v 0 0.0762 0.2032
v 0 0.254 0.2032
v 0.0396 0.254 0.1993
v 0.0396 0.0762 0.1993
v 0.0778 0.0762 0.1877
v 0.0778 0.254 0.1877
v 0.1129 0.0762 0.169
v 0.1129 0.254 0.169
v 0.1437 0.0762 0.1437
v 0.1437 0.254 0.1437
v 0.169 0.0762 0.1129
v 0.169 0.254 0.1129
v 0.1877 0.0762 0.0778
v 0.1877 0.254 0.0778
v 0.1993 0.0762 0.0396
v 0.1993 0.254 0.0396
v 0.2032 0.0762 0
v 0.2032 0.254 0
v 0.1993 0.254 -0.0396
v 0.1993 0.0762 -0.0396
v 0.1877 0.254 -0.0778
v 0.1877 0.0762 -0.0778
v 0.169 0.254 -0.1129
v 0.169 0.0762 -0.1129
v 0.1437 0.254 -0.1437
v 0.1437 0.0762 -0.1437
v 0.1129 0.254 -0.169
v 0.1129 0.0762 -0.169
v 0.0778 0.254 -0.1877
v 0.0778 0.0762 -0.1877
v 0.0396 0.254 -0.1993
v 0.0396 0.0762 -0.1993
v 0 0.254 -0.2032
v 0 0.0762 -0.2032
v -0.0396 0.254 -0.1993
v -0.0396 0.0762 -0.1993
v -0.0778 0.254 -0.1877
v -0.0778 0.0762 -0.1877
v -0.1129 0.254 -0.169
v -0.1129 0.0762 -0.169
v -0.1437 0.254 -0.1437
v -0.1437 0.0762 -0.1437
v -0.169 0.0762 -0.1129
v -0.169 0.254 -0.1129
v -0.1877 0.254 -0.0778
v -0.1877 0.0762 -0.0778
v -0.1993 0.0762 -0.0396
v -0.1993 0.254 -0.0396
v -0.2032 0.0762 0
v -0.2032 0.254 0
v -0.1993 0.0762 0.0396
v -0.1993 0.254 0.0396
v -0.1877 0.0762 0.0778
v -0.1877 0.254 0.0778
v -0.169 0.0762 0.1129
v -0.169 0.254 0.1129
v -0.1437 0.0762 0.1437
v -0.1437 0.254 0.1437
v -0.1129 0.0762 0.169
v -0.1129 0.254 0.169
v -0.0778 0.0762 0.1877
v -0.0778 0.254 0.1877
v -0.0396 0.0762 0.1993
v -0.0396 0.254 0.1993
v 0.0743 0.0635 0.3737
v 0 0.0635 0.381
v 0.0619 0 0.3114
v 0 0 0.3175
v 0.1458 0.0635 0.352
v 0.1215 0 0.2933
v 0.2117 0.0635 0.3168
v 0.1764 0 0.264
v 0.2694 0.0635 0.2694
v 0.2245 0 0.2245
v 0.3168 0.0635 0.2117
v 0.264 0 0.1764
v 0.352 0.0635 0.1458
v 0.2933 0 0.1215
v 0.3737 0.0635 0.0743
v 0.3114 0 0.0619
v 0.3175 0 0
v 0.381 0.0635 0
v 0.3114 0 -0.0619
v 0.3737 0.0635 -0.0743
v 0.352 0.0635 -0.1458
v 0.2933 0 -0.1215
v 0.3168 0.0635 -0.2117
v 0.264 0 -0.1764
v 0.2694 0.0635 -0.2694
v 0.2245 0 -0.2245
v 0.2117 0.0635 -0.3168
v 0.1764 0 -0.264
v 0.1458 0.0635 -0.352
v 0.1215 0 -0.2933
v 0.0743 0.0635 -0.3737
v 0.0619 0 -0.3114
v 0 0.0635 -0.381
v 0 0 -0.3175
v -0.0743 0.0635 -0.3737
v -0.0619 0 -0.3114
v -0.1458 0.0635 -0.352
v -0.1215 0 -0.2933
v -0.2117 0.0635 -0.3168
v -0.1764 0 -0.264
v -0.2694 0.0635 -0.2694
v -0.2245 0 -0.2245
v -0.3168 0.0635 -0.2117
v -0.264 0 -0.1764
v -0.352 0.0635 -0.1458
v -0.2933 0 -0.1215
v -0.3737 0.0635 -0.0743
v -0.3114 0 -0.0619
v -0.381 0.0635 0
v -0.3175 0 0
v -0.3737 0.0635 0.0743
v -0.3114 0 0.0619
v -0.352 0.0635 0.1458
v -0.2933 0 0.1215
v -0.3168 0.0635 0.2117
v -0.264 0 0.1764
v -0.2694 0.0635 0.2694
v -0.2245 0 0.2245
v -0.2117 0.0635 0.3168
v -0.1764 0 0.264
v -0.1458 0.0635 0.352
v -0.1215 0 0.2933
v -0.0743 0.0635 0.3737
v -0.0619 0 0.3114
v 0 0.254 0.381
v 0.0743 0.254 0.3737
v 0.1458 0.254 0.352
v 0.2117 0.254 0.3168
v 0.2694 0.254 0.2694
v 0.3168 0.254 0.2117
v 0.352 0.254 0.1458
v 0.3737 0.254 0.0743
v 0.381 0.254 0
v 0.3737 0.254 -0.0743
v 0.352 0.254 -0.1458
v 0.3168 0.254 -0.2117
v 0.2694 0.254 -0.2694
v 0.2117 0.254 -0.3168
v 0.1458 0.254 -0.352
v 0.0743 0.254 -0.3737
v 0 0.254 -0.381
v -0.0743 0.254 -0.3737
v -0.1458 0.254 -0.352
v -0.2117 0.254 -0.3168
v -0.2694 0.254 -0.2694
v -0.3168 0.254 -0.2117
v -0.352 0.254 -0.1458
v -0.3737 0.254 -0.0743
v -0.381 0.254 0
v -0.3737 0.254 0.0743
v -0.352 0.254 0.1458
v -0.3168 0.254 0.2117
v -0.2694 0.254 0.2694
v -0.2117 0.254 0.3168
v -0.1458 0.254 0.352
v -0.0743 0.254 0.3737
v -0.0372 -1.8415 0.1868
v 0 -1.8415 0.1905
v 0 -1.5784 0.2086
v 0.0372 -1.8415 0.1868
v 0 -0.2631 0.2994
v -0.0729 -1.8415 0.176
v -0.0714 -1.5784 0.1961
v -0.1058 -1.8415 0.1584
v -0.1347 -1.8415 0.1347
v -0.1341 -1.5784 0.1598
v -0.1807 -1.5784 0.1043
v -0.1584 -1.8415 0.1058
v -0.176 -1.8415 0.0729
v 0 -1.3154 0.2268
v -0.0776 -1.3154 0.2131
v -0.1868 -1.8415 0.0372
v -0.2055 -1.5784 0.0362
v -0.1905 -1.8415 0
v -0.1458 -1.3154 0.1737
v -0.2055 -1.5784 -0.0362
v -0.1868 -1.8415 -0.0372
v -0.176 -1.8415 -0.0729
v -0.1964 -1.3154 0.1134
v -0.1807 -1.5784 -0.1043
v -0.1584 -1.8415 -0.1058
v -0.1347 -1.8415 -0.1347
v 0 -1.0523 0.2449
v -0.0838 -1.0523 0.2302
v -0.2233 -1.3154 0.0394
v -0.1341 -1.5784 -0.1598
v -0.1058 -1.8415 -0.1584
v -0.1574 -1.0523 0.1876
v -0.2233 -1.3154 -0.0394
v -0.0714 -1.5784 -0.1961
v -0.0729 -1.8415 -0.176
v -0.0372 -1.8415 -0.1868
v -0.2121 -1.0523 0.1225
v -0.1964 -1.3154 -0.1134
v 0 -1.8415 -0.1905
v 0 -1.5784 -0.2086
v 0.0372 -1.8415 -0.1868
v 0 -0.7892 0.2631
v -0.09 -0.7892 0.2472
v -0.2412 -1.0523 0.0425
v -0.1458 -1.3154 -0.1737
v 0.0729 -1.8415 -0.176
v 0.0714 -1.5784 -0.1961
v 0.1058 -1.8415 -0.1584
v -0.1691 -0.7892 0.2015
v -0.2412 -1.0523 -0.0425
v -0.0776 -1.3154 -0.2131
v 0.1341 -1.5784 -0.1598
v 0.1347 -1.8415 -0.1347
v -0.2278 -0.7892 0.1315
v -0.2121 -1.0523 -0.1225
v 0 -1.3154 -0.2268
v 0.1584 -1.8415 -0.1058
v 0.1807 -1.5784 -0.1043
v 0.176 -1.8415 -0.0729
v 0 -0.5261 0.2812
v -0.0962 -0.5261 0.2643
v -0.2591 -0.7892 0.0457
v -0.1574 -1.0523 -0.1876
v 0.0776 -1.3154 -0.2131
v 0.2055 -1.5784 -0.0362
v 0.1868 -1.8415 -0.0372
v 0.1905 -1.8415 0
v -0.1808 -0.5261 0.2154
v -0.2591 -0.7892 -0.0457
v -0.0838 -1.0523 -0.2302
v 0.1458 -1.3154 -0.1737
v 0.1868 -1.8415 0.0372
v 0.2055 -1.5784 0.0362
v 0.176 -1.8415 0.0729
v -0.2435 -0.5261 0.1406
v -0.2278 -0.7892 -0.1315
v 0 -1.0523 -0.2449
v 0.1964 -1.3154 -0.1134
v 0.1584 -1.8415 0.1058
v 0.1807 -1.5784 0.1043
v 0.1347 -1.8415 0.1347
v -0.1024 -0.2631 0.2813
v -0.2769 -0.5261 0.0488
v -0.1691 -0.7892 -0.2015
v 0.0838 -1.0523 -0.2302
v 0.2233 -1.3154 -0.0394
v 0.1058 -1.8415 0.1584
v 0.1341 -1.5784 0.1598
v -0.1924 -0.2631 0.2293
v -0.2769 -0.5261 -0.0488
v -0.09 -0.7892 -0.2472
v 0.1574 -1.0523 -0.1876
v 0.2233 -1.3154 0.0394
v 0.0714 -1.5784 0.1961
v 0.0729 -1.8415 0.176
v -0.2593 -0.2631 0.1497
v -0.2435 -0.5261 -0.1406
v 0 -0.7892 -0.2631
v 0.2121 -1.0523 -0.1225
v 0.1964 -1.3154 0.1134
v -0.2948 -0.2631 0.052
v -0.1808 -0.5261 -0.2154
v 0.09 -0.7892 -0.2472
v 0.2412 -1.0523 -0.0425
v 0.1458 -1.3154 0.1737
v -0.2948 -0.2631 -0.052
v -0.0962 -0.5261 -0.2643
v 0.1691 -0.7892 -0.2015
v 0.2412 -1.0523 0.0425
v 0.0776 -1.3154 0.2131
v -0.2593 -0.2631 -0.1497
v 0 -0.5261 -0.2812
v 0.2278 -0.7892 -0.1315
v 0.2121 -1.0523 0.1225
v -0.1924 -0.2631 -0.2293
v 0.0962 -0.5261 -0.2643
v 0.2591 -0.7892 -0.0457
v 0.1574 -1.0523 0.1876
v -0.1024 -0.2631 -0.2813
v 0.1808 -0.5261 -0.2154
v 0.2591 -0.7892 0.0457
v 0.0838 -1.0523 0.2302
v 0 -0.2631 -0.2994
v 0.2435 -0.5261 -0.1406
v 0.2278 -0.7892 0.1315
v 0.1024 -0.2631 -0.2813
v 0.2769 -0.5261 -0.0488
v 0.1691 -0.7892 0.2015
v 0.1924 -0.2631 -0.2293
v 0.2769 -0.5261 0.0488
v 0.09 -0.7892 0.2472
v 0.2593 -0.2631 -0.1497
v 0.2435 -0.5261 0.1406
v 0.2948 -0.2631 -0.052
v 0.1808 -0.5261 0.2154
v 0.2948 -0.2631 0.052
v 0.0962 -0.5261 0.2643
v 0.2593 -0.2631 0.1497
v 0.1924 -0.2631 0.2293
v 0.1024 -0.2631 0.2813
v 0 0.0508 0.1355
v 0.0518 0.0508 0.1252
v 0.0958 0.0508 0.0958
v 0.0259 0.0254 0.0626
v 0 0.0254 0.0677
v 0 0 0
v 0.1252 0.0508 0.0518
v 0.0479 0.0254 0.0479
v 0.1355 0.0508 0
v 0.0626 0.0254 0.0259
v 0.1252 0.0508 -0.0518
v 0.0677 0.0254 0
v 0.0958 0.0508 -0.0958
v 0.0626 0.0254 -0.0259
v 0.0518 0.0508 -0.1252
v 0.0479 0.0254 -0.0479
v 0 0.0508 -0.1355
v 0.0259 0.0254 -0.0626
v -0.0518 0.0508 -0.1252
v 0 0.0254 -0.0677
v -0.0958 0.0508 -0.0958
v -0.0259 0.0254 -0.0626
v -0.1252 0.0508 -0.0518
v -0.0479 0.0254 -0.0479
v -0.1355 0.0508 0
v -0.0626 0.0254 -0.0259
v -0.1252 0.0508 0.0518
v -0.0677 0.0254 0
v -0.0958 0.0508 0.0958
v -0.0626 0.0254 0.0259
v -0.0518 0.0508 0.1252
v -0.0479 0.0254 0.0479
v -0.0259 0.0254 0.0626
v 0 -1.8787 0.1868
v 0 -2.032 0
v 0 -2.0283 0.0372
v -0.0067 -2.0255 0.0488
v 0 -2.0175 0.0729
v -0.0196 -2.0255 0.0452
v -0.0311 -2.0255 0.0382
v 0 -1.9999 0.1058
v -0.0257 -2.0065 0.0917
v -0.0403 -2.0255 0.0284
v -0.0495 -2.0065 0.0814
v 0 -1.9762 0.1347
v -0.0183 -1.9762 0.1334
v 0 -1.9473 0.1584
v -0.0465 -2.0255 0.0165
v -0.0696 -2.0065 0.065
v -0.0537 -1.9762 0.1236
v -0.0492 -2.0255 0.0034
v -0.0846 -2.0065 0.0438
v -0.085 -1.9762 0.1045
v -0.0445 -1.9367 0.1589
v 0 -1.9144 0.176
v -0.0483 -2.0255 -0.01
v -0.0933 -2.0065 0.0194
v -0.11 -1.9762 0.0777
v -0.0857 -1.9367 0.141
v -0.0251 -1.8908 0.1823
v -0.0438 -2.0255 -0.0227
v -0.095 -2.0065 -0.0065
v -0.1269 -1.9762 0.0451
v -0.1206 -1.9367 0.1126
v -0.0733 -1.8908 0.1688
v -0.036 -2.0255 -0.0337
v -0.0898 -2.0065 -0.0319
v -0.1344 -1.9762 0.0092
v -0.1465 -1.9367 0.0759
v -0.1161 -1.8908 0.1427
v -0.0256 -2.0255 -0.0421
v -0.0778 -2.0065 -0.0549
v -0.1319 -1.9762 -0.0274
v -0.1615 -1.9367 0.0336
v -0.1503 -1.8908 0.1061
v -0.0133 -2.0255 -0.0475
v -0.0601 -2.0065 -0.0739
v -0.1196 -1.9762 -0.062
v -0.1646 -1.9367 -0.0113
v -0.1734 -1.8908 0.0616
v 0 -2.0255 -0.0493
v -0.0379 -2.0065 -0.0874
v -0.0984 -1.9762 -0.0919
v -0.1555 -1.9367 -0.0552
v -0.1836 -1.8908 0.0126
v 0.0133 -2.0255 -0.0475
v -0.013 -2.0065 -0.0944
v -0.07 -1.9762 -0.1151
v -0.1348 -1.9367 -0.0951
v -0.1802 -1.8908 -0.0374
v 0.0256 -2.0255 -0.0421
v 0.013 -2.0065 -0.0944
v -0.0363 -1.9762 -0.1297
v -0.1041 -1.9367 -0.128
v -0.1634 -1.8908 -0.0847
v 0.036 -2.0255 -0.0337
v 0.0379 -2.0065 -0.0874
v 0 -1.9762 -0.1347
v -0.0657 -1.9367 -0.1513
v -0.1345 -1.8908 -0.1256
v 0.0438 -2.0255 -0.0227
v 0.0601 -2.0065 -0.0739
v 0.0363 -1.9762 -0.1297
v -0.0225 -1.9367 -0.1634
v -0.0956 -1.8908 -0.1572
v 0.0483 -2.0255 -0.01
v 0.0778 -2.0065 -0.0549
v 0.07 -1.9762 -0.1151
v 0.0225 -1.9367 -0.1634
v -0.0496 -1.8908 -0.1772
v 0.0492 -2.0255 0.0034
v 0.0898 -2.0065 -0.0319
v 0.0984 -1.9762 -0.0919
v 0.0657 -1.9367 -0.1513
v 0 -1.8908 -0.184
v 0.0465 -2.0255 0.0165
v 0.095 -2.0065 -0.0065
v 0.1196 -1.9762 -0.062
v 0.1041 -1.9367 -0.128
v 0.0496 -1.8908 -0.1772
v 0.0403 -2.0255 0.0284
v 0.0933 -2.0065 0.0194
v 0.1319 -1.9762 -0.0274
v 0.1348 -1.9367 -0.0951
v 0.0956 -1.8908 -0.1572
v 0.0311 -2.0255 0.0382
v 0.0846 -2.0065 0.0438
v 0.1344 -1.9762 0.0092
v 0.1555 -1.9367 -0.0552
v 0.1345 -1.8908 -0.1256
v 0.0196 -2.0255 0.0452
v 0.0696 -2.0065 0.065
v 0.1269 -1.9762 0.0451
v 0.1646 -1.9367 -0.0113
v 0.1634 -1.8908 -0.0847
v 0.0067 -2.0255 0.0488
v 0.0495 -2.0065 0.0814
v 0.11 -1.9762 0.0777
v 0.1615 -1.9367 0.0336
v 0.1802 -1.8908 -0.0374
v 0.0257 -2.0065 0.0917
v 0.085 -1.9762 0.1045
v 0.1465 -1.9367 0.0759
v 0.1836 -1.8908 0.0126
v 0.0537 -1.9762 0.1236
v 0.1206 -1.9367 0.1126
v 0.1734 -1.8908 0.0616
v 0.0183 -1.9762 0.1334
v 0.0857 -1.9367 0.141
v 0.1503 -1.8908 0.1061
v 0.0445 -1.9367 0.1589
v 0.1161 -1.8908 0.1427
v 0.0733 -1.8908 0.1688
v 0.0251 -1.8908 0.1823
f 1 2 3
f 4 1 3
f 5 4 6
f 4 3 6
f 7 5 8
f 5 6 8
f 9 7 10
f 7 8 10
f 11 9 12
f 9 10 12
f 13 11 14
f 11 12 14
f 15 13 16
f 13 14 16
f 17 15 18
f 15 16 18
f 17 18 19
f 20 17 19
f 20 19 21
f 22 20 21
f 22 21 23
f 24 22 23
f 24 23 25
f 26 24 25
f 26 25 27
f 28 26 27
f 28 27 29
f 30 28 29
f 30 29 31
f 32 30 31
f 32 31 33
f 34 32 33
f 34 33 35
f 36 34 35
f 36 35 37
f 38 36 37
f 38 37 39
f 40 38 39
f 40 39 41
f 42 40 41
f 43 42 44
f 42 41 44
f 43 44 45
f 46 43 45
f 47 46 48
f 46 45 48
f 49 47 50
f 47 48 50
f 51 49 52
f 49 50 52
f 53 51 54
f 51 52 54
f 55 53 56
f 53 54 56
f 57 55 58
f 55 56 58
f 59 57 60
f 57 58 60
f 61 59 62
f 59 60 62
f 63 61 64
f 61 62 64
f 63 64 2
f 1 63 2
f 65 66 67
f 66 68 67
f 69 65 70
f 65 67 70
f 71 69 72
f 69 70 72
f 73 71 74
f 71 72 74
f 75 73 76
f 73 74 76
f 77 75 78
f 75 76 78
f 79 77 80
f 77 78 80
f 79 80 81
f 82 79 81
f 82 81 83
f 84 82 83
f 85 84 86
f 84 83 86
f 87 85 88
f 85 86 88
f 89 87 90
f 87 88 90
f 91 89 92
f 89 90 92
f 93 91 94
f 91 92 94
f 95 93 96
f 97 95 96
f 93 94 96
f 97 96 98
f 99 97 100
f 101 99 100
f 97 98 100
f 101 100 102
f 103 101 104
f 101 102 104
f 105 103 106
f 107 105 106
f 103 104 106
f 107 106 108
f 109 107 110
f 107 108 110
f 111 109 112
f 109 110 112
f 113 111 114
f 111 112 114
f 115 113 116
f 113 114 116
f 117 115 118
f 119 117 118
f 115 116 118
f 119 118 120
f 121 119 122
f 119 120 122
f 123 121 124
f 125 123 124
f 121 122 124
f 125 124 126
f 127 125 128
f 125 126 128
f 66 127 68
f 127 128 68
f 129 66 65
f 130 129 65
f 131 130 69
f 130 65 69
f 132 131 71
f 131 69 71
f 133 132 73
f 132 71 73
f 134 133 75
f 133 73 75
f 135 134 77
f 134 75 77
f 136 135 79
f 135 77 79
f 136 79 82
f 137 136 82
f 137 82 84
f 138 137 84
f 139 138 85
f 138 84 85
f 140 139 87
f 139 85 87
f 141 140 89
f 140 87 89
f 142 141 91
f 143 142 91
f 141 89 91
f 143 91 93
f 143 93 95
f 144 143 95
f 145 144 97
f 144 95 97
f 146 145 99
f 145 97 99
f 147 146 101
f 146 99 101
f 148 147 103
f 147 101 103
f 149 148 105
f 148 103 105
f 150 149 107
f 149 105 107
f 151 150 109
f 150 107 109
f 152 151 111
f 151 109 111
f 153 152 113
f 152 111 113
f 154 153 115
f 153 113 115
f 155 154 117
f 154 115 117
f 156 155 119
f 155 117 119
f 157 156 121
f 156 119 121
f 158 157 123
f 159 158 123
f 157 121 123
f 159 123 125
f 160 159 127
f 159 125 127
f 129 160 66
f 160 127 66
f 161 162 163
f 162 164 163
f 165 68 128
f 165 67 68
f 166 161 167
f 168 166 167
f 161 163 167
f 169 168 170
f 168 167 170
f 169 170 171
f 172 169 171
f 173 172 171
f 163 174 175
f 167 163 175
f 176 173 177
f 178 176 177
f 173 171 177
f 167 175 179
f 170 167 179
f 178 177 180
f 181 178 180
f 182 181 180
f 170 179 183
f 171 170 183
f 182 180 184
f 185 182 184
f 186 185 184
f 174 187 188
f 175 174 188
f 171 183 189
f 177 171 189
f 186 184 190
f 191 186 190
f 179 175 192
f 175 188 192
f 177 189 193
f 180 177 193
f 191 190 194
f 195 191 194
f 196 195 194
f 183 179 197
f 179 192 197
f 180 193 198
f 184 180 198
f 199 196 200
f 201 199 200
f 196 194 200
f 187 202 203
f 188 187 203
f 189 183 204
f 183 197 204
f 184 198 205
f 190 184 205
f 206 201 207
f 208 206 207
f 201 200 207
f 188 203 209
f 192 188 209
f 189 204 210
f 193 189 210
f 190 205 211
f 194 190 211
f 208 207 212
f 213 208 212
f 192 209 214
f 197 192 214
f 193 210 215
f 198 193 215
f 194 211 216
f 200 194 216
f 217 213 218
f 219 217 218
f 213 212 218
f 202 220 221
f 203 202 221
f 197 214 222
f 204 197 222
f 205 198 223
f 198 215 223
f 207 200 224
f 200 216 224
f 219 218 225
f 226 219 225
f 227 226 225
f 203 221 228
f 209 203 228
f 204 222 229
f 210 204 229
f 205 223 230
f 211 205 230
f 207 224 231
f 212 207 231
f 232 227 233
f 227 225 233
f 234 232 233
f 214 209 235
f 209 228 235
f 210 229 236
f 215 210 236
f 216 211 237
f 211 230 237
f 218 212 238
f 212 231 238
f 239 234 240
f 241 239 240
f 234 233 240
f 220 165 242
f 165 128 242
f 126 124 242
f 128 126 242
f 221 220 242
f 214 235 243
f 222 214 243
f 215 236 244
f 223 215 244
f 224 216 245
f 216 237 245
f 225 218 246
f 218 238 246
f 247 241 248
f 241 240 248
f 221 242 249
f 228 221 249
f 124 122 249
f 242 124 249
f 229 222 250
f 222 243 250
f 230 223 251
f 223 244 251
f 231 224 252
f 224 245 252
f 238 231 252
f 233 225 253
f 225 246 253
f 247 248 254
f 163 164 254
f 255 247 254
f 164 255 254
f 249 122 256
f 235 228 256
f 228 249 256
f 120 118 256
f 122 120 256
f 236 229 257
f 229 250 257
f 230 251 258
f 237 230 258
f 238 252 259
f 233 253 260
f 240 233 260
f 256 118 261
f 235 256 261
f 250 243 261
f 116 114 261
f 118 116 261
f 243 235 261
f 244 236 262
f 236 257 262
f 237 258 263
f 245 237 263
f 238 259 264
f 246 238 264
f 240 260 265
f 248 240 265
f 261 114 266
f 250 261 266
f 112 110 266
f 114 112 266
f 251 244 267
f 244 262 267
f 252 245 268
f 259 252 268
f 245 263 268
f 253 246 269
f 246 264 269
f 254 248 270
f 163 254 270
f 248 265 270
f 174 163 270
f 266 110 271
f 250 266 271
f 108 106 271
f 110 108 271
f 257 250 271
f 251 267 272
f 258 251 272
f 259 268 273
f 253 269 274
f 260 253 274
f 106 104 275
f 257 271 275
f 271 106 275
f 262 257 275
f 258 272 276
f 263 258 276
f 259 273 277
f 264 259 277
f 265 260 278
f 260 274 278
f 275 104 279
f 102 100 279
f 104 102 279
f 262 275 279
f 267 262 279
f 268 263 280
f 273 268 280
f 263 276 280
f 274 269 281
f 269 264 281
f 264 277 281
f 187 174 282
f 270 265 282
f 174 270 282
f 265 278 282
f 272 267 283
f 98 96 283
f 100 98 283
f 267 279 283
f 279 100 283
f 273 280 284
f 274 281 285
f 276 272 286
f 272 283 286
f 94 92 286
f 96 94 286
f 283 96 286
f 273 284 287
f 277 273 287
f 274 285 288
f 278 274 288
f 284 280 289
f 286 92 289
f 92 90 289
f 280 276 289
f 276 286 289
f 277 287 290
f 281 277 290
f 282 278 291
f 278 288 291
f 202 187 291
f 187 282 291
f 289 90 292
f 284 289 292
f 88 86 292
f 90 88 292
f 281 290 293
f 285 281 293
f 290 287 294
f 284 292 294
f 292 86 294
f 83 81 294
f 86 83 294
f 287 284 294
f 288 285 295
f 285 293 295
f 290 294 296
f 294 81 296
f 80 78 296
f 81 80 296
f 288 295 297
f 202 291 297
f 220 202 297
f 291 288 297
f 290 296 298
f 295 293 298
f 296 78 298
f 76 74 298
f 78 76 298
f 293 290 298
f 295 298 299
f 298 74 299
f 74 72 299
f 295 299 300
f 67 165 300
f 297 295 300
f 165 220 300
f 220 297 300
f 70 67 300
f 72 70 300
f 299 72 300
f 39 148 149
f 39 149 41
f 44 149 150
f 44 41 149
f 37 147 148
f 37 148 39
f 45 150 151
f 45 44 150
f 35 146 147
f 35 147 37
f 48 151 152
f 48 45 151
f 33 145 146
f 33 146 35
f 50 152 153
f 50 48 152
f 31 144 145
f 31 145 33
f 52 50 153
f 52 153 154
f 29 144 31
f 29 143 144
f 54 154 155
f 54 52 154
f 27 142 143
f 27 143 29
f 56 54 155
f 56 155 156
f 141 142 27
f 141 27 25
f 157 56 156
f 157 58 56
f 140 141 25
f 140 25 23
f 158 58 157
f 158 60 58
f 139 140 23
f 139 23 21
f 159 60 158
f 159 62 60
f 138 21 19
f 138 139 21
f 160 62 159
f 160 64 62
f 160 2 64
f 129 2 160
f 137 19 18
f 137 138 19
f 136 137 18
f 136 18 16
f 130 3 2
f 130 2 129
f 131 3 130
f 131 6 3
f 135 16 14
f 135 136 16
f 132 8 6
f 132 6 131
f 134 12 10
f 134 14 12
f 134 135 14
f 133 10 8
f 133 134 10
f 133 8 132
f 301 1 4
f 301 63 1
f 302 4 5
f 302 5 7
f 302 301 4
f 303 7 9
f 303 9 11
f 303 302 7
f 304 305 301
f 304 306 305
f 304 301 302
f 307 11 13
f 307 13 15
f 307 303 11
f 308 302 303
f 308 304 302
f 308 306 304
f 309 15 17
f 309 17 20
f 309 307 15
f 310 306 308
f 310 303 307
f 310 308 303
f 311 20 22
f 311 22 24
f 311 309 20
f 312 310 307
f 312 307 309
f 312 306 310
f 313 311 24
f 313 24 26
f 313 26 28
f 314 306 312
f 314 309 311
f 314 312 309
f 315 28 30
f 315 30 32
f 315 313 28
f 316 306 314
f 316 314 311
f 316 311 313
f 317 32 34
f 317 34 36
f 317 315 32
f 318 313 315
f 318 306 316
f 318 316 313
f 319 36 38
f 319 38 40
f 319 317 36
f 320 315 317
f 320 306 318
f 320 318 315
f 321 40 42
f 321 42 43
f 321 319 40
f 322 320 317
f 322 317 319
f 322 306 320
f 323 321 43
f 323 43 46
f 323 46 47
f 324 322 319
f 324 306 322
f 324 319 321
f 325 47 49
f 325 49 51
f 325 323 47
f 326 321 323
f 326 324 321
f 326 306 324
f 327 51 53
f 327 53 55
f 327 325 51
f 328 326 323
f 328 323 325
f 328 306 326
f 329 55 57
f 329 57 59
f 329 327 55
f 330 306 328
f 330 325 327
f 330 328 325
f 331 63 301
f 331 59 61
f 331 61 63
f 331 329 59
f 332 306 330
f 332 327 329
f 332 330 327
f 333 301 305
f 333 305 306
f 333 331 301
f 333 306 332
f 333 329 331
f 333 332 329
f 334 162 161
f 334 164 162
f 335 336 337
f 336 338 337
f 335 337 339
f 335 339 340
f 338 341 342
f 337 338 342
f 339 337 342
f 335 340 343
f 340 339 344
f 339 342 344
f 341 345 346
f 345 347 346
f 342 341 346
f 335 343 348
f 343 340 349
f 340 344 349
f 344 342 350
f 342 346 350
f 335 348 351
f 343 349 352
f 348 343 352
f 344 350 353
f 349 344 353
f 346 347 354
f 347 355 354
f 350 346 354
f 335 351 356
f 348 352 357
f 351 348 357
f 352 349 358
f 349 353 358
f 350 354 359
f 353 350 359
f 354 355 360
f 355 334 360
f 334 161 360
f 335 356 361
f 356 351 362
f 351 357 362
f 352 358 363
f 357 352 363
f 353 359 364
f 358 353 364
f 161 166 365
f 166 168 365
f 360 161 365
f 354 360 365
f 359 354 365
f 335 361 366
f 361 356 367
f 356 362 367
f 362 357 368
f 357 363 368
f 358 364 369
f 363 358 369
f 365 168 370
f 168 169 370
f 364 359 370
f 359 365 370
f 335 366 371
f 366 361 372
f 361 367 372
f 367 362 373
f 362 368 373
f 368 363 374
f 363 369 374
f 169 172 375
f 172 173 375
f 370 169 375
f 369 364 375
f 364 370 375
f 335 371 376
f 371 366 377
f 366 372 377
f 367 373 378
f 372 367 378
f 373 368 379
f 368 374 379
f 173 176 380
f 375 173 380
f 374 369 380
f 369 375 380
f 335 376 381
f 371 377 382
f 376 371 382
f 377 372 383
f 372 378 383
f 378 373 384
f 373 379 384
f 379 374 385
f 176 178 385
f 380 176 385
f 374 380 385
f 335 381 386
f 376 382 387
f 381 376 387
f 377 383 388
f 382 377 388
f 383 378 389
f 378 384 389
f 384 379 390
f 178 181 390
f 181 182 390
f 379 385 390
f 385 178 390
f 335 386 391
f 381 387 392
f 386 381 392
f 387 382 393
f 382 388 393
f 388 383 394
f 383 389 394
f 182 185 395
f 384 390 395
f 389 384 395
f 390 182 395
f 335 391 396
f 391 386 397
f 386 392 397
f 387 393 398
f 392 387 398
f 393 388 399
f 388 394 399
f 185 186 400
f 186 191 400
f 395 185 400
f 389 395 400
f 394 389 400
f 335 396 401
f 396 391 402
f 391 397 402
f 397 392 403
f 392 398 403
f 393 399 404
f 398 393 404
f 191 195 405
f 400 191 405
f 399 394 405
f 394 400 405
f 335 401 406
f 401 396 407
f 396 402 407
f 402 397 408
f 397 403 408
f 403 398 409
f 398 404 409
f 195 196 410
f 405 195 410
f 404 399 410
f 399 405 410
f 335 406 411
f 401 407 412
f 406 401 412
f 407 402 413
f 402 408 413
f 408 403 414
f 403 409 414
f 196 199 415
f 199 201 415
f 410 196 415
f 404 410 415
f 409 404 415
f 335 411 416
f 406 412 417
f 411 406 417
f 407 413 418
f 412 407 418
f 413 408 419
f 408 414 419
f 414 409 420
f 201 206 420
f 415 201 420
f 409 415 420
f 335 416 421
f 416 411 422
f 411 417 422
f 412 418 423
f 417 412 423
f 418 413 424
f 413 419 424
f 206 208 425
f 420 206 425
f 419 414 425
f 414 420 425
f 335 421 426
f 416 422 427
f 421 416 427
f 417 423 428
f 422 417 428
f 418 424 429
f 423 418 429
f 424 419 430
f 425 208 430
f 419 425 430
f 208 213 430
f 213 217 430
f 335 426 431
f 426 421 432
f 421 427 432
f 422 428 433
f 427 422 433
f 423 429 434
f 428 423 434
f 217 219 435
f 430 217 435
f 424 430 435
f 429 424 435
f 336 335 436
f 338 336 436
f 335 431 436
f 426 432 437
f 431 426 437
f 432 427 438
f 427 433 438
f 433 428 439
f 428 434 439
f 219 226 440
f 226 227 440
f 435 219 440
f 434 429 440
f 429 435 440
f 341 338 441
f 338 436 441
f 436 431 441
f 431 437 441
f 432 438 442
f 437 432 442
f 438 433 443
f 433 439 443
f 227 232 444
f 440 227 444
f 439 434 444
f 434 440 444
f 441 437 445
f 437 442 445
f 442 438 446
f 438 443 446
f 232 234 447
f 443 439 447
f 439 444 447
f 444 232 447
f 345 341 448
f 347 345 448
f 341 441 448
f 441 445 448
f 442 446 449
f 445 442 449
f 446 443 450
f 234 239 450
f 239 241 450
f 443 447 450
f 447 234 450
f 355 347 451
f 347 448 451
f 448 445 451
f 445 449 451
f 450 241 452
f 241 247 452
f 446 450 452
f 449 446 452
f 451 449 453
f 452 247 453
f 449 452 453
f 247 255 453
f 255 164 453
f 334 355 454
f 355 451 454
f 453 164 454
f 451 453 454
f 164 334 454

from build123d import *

# Parameters (mm, degrees)
SKETCH1_R           = 0.381
BOSS_EXTRUDE1_DEPTH = 0.254
CHAMFER1_SIZE       = 0.0635
SKETCH5_R           = 0.2032
CUT_EXTRUDE1_DEPTH  = 0.254
CHAMFER2_SIZE       = 0.0762


with BuildPart() as part:
    # Sketch1 → Boss-Extrude1 (new body)
    with BuildSketch(Plane(origin=(0, 0, 0), x_dir=(1, 0, 0), z_dir=(0, 1, 0))):
        with Locations(Location((0, 0, 0), (0, 0, 270))):
            Circle(SKETCH1_R)
    extrude(amount=BOSS_EXTRUDE1_DEPTH)

    # Chamfer1
    chamfer1_edges = [part.edges().sort_by_distance(p)[0] for p in [
        (0, 0, -0.381),
    ]]
    chamfer(chamfer1_edges, length=CHAMFER1_SIZE)

    # Sketch4 → Revolve1 (revolve)
    with BuildSketch(Plane.ZY):
        with BuildLine():
            Line((0, 0), (0, -2.032))
            ThreePointArc((0, -2.032), (0.134703842, -1.976203842), (0.1905, -1.8415))
            Line((0.1905, -1.8415), (0.3175, 0))
            Line((0.3175, 0), (0, 0))
        make_face()
    revolve(axis=Axis((0, 0.254, 0), (0, -1, 0)))

    # Sketch5 → Cut-Extrude1 (cut)
    with BuildSketch(Plane(origin=(0, 0.254, 0), x_dir=(1, 0, 0), z_dir=(0, 1, 0))):
        with Locations(Location((0, 0, 0), (0, 0, 270))):
            Circle(SKETCH5_R)
    extrude(amount=-CUT_EXTRUDE1_DEPTH, mode=Mode.SUBTRACT)

    # Chamfer2
    # the kernel refuses this chamfer: 0.203200488, 0.0762 mm, written as the material it adds along each edge
    with BuildSketch(Plane(origin=(0, 0, 0), x_dir=(0, 0, 1), z_dir=(-1, 0, 0))) as chamfer2_piece_1:
        Polygon((0.2032, CHAMFER2_SIZE), (0, 1.83e-07), (0, 0), (0.2032, 0), align=None)
    revolve(axis=Axis((0, 0, 0), (0, 1, 0)))


solid = part.part
